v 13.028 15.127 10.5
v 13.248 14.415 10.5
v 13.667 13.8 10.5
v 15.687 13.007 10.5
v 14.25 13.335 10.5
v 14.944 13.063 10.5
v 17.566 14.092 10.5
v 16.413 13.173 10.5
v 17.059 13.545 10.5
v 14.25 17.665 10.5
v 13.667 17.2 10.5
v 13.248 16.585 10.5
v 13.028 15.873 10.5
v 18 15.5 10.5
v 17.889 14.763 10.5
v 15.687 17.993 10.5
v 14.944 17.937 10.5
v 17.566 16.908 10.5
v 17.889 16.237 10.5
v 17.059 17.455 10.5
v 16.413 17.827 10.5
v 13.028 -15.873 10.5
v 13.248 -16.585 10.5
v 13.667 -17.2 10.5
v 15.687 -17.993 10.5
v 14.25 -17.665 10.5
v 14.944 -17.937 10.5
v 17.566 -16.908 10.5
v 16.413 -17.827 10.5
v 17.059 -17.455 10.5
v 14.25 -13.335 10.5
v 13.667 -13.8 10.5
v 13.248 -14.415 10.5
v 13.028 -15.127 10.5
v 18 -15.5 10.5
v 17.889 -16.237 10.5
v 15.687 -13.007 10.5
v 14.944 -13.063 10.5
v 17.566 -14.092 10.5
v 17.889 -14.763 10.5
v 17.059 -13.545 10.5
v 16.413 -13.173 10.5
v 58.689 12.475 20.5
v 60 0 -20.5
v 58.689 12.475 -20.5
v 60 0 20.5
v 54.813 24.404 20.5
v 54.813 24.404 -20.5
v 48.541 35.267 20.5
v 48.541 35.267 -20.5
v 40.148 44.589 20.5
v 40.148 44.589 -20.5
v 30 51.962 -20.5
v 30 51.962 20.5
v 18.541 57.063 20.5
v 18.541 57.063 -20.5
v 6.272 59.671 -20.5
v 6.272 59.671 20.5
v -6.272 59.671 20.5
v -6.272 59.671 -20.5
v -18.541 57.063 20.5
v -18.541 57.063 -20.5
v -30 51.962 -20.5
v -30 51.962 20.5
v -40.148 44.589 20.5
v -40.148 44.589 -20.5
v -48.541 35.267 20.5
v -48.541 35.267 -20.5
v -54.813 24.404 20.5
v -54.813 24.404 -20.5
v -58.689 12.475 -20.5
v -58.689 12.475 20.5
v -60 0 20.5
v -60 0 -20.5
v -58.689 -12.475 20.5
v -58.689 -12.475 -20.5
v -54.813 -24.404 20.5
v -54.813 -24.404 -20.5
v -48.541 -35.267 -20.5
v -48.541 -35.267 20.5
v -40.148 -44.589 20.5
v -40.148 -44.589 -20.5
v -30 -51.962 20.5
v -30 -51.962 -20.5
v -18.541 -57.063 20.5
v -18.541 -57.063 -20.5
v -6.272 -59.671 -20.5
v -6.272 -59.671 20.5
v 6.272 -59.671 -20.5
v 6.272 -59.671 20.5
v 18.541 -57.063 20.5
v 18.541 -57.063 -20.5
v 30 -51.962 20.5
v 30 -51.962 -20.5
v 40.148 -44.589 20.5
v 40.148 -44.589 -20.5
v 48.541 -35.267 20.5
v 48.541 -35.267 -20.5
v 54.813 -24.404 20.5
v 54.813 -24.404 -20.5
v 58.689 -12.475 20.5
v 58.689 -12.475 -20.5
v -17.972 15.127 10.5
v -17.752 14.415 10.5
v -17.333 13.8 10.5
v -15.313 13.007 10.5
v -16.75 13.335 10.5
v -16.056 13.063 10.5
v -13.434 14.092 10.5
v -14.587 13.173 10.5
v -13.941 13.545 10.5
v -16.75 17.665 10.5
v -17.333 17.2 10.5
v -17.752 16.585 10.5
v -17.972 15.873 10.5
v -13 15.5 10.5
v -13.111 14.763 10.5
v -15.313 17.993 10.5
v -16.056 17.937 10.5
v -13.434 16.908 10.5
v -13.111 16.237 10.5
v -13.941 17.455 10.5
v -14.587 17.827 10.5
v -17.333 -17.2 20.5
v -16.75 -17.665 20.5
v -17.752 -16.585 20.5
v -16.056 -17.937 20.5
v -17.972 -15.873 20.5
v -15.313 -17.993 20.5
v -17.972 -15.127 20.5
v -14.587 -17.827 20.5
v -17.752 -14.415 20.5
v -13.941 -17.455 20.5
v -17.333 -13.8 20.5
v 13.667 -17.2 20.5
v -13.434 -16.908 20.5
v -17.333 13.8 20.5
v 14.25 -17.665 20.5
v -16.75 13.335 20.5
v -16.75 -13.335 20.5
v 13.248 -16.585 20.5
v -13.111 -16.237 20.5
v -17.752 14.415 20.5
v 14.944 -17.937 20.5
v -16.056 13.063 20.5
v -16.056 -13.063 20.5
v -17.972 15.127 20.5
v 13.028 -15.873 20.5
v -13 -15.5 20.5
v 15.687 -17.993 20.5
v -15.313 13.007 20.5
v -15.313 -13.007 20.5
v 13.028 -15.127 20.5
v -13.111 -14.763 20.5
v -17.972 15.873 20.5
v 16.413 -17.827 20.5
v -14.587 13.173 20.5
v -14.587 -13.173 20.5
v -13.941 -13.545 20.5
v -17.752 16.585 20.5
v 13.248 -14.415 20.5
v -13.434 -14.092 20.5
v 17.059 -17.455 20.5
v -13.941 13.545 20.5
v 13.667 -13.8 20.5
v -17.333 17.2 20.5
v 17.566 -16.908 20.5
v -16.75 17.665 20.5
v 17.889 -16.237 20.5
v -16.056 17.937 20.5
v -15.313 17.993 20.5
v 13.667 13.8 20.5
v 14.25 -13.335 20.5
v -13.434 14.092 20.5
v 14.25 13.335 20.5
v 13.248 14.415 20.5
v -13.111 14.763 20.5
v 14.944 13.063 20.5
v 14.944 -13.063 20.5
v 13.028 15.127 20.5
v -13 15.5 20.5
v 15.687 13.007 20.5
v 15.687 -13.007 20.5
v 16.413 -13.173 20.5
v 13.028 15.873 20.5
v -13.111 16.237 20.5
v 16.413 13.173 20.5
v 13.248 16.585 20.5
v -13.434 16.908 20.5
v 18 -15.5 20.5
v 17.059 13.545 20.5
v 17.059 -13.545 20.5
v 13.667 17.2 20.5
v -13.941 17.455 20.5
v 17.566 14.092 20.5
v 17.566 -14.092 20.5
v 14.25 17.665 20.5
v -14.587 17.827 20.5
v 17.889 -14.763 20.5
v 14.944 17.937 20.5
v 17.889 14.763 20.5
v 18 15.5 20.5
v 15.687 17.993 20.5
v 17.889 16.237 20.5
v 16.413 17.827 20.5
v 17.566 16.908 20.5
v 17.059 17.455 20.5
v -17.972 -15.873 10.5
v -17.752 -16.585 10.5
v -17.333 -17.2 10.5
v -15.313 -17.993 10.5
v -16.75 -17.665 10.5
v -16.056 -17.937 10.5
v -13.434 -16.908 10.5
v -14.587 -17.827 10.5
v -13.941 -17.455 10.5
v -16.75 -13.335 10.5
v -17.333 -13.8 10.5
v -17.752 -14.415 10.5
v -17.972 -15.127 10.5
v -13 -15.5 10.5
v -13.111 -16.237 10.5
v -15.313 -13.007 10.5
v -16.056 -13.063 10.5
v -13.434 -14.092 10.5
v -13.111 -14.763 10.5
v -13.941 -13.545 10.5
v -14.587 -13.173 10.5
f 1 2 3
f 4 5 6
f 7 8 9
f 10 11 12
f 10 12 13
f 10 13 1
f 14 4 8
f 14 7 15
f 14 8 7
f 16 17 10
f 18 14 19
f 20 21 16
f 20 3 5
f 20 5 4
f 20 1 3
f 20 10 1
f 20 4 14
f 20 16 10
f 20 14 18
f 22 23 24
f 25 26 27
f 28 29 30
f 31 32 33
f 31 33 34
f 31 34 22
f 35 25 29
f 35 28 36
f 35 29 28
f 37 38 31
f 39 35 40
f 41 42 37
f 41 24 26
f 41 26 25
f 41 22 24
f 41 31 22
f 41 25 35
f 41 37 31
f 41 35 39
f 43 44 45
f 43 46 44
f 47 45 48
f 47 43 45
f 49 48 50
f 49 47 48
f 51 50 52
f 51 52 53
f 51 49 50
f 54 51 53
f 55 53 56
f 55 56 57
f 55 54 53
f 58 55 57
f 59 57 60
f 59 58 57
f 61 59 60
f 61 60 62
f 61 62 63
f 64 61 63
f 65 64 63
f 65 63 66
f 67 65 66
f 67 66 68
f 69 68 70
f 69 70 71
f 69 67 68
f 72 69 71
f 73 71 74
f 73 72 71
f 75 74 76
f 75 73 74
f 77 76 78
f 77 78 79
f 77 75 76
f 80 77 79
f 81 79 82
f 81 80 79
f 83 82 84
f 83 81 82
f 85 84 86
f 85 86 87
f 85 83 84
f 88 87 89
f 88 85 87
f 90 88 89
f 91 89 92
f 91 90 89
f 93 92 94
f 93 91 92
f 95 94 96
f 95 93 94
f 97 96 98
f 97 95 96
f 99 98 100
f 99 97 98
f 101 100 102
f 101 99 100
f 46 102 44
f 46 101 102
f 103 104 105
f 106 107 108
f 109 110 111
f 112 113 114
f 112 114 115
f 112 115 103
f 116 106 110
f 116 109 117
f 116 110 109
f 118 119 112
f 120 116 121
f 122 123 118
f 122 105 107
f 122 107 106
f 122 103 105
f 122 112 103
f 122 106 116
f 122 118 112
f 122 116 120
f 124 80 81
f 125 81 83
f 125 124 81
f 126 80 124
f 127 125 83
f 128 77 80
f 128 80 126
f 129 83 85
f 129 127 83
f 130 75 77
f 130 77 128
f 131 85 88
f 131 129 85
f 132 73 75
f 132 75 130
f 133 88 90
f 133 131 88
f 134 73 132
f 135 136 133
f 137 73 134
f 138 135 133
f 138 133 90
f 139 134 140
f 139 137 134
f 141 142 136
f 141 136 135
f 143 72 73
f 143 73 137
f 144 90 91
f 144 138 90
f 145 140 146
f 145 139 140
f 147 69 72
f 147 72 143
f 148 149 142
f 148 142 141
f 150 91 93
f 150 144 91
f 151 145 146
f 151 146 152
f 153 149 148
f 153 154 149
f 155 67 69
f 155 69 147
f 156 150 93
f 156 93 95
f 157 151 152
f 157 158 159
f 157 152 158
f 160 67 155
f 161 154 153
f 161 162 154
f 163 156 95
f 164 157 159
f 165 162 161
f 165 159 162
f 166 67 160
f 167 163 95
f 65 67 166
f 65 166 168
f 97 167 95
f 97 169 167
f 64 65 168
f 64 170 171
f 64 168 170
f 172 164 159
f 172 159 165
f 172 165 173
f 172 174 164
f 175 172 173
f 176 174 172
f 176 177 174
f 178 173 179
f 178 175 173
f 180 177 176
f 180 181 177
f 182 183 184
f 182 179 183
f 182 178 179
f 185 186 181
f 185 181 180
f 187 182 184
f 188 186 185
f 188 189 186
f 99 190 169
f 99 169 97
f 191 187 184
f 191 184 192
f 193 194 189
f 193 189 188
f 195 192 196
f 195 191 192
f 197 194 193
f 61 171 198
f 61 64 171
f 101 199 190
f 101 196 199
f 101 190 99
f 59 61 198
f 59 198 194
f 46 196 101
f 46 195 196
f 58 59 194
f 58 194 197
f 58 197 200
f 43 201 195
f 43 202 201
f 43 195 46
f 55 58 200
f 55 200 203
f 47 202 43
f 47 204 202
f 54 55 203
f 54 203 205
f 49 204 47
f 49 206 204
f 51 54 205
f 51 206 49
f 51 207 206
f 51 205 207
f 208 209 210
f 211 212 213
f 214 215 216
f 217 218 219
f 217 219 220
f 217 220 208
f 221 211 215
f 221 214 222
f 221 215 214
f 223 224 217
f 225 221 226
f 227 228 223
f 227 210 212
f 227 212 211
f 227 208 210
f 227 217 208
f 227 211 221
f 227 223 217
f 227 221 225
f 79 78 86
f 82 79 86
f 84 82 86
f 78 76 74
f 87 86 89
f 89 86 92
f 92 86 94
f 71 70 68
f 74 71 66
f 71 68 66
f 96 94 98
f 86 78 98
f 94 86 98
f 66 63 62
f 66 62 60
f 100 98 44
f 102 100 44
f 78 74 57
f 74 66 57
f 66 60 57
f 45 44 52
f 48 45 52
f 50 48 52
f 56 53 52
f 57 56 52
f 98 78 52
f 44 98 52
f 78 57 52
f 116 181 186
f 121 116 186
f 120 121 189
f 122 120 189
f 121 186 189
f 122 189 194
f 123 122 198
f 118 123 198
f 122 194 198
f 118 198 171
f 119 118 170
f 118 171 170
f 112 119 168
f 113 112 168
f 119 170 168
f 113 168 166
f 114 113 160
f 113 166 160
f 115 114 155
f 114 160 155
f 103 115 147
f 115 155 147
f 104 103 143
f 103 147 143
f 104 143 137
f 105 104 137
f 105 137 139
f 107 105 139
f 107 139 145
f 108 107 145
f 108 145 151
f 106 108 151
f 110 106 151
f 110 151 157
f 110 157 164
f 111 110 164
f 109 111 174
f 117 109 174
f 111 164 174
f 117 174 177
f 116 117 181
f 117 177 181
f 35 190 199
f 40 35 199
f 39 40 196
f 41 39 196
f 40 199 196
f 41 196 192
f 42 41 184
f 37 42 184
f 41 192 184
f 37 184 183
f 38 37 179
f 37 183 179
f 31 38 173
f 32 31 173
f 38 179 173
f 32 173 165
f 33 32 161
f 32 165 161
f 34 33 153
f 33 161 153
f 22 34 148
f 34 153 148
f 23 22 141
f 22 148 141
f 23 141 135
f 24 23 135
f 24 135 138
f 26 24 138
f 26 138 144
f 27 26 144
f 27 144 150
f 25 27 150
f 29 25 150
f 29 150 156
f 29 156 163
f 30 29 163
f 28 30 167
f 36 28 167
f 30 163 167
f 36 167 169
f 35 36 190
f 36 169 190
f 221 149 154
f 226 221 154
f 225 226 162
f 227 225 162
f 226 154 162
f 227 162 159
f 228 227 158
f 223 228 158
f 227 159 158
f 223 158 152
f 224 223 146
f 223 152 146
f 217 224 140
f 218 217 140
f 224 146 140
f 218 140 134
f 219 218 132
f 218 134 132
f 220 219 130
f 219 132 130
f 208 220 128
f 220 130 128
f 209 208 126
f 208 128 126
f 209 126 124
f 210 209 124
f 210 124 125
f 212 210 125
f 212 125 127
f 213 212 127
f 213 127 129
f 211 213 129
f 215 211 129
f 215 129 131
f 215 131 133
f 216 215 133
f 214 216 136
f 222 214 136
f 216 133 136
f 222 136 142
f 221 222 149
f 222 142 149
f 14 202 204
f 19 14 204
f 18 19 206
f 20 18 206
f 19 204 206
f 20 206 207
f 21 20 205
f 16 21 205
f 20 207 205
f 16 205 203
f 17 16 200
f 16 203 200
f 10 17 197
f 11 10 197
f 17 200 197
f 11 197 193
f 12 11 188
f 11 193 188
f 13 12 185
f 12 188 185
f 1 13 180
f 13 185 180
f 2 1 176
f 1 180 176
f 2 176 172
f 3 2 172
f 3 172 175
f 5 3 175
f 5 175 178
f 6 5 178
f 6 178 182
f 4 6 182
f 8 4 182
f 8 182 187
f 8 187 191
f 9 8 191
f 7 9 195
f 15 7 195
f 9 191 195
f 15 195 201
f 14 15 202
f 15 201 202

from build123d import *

# Parameters (mm, degrees)
SKETCH1_R           = 60
BOSS_EXTRUDE1_DEPTH = 20.5
SKETCH2_R           = 2.5
CUT_EXTRUDE1_DEPTH  = 10


with BuildPart() as part:
    # Sketch1 → Boss-Extrude1 (new, symmetric)
    with BuildSketch(Plane.XY):
        Circle(SKETCH1_R)
    extrude(amount=BOSS_EXTRUDE1_DEPTH, both=True)

    # Sketch2 → Cut-Extrude1 (cut)
    with BuildSketch(Plane.XY.offset(20.5)):
        with Locations((-15.5, 15.5)):
            Circle(SKETCH2_R)
        with Locations((15.5, 15.5)):
            Circle(SKETCH2_R)
        with Locations((15.5, -15.5)):
            Circle(SKETCH2_R)
        with Locations((-15.5, -15.5)):
            Circle(SKETCH2_R)
    extrude(amount=-CUT_EXTRUDE1_DEPTH, mode=Mode.SUBTRACT)


solid = part.part
